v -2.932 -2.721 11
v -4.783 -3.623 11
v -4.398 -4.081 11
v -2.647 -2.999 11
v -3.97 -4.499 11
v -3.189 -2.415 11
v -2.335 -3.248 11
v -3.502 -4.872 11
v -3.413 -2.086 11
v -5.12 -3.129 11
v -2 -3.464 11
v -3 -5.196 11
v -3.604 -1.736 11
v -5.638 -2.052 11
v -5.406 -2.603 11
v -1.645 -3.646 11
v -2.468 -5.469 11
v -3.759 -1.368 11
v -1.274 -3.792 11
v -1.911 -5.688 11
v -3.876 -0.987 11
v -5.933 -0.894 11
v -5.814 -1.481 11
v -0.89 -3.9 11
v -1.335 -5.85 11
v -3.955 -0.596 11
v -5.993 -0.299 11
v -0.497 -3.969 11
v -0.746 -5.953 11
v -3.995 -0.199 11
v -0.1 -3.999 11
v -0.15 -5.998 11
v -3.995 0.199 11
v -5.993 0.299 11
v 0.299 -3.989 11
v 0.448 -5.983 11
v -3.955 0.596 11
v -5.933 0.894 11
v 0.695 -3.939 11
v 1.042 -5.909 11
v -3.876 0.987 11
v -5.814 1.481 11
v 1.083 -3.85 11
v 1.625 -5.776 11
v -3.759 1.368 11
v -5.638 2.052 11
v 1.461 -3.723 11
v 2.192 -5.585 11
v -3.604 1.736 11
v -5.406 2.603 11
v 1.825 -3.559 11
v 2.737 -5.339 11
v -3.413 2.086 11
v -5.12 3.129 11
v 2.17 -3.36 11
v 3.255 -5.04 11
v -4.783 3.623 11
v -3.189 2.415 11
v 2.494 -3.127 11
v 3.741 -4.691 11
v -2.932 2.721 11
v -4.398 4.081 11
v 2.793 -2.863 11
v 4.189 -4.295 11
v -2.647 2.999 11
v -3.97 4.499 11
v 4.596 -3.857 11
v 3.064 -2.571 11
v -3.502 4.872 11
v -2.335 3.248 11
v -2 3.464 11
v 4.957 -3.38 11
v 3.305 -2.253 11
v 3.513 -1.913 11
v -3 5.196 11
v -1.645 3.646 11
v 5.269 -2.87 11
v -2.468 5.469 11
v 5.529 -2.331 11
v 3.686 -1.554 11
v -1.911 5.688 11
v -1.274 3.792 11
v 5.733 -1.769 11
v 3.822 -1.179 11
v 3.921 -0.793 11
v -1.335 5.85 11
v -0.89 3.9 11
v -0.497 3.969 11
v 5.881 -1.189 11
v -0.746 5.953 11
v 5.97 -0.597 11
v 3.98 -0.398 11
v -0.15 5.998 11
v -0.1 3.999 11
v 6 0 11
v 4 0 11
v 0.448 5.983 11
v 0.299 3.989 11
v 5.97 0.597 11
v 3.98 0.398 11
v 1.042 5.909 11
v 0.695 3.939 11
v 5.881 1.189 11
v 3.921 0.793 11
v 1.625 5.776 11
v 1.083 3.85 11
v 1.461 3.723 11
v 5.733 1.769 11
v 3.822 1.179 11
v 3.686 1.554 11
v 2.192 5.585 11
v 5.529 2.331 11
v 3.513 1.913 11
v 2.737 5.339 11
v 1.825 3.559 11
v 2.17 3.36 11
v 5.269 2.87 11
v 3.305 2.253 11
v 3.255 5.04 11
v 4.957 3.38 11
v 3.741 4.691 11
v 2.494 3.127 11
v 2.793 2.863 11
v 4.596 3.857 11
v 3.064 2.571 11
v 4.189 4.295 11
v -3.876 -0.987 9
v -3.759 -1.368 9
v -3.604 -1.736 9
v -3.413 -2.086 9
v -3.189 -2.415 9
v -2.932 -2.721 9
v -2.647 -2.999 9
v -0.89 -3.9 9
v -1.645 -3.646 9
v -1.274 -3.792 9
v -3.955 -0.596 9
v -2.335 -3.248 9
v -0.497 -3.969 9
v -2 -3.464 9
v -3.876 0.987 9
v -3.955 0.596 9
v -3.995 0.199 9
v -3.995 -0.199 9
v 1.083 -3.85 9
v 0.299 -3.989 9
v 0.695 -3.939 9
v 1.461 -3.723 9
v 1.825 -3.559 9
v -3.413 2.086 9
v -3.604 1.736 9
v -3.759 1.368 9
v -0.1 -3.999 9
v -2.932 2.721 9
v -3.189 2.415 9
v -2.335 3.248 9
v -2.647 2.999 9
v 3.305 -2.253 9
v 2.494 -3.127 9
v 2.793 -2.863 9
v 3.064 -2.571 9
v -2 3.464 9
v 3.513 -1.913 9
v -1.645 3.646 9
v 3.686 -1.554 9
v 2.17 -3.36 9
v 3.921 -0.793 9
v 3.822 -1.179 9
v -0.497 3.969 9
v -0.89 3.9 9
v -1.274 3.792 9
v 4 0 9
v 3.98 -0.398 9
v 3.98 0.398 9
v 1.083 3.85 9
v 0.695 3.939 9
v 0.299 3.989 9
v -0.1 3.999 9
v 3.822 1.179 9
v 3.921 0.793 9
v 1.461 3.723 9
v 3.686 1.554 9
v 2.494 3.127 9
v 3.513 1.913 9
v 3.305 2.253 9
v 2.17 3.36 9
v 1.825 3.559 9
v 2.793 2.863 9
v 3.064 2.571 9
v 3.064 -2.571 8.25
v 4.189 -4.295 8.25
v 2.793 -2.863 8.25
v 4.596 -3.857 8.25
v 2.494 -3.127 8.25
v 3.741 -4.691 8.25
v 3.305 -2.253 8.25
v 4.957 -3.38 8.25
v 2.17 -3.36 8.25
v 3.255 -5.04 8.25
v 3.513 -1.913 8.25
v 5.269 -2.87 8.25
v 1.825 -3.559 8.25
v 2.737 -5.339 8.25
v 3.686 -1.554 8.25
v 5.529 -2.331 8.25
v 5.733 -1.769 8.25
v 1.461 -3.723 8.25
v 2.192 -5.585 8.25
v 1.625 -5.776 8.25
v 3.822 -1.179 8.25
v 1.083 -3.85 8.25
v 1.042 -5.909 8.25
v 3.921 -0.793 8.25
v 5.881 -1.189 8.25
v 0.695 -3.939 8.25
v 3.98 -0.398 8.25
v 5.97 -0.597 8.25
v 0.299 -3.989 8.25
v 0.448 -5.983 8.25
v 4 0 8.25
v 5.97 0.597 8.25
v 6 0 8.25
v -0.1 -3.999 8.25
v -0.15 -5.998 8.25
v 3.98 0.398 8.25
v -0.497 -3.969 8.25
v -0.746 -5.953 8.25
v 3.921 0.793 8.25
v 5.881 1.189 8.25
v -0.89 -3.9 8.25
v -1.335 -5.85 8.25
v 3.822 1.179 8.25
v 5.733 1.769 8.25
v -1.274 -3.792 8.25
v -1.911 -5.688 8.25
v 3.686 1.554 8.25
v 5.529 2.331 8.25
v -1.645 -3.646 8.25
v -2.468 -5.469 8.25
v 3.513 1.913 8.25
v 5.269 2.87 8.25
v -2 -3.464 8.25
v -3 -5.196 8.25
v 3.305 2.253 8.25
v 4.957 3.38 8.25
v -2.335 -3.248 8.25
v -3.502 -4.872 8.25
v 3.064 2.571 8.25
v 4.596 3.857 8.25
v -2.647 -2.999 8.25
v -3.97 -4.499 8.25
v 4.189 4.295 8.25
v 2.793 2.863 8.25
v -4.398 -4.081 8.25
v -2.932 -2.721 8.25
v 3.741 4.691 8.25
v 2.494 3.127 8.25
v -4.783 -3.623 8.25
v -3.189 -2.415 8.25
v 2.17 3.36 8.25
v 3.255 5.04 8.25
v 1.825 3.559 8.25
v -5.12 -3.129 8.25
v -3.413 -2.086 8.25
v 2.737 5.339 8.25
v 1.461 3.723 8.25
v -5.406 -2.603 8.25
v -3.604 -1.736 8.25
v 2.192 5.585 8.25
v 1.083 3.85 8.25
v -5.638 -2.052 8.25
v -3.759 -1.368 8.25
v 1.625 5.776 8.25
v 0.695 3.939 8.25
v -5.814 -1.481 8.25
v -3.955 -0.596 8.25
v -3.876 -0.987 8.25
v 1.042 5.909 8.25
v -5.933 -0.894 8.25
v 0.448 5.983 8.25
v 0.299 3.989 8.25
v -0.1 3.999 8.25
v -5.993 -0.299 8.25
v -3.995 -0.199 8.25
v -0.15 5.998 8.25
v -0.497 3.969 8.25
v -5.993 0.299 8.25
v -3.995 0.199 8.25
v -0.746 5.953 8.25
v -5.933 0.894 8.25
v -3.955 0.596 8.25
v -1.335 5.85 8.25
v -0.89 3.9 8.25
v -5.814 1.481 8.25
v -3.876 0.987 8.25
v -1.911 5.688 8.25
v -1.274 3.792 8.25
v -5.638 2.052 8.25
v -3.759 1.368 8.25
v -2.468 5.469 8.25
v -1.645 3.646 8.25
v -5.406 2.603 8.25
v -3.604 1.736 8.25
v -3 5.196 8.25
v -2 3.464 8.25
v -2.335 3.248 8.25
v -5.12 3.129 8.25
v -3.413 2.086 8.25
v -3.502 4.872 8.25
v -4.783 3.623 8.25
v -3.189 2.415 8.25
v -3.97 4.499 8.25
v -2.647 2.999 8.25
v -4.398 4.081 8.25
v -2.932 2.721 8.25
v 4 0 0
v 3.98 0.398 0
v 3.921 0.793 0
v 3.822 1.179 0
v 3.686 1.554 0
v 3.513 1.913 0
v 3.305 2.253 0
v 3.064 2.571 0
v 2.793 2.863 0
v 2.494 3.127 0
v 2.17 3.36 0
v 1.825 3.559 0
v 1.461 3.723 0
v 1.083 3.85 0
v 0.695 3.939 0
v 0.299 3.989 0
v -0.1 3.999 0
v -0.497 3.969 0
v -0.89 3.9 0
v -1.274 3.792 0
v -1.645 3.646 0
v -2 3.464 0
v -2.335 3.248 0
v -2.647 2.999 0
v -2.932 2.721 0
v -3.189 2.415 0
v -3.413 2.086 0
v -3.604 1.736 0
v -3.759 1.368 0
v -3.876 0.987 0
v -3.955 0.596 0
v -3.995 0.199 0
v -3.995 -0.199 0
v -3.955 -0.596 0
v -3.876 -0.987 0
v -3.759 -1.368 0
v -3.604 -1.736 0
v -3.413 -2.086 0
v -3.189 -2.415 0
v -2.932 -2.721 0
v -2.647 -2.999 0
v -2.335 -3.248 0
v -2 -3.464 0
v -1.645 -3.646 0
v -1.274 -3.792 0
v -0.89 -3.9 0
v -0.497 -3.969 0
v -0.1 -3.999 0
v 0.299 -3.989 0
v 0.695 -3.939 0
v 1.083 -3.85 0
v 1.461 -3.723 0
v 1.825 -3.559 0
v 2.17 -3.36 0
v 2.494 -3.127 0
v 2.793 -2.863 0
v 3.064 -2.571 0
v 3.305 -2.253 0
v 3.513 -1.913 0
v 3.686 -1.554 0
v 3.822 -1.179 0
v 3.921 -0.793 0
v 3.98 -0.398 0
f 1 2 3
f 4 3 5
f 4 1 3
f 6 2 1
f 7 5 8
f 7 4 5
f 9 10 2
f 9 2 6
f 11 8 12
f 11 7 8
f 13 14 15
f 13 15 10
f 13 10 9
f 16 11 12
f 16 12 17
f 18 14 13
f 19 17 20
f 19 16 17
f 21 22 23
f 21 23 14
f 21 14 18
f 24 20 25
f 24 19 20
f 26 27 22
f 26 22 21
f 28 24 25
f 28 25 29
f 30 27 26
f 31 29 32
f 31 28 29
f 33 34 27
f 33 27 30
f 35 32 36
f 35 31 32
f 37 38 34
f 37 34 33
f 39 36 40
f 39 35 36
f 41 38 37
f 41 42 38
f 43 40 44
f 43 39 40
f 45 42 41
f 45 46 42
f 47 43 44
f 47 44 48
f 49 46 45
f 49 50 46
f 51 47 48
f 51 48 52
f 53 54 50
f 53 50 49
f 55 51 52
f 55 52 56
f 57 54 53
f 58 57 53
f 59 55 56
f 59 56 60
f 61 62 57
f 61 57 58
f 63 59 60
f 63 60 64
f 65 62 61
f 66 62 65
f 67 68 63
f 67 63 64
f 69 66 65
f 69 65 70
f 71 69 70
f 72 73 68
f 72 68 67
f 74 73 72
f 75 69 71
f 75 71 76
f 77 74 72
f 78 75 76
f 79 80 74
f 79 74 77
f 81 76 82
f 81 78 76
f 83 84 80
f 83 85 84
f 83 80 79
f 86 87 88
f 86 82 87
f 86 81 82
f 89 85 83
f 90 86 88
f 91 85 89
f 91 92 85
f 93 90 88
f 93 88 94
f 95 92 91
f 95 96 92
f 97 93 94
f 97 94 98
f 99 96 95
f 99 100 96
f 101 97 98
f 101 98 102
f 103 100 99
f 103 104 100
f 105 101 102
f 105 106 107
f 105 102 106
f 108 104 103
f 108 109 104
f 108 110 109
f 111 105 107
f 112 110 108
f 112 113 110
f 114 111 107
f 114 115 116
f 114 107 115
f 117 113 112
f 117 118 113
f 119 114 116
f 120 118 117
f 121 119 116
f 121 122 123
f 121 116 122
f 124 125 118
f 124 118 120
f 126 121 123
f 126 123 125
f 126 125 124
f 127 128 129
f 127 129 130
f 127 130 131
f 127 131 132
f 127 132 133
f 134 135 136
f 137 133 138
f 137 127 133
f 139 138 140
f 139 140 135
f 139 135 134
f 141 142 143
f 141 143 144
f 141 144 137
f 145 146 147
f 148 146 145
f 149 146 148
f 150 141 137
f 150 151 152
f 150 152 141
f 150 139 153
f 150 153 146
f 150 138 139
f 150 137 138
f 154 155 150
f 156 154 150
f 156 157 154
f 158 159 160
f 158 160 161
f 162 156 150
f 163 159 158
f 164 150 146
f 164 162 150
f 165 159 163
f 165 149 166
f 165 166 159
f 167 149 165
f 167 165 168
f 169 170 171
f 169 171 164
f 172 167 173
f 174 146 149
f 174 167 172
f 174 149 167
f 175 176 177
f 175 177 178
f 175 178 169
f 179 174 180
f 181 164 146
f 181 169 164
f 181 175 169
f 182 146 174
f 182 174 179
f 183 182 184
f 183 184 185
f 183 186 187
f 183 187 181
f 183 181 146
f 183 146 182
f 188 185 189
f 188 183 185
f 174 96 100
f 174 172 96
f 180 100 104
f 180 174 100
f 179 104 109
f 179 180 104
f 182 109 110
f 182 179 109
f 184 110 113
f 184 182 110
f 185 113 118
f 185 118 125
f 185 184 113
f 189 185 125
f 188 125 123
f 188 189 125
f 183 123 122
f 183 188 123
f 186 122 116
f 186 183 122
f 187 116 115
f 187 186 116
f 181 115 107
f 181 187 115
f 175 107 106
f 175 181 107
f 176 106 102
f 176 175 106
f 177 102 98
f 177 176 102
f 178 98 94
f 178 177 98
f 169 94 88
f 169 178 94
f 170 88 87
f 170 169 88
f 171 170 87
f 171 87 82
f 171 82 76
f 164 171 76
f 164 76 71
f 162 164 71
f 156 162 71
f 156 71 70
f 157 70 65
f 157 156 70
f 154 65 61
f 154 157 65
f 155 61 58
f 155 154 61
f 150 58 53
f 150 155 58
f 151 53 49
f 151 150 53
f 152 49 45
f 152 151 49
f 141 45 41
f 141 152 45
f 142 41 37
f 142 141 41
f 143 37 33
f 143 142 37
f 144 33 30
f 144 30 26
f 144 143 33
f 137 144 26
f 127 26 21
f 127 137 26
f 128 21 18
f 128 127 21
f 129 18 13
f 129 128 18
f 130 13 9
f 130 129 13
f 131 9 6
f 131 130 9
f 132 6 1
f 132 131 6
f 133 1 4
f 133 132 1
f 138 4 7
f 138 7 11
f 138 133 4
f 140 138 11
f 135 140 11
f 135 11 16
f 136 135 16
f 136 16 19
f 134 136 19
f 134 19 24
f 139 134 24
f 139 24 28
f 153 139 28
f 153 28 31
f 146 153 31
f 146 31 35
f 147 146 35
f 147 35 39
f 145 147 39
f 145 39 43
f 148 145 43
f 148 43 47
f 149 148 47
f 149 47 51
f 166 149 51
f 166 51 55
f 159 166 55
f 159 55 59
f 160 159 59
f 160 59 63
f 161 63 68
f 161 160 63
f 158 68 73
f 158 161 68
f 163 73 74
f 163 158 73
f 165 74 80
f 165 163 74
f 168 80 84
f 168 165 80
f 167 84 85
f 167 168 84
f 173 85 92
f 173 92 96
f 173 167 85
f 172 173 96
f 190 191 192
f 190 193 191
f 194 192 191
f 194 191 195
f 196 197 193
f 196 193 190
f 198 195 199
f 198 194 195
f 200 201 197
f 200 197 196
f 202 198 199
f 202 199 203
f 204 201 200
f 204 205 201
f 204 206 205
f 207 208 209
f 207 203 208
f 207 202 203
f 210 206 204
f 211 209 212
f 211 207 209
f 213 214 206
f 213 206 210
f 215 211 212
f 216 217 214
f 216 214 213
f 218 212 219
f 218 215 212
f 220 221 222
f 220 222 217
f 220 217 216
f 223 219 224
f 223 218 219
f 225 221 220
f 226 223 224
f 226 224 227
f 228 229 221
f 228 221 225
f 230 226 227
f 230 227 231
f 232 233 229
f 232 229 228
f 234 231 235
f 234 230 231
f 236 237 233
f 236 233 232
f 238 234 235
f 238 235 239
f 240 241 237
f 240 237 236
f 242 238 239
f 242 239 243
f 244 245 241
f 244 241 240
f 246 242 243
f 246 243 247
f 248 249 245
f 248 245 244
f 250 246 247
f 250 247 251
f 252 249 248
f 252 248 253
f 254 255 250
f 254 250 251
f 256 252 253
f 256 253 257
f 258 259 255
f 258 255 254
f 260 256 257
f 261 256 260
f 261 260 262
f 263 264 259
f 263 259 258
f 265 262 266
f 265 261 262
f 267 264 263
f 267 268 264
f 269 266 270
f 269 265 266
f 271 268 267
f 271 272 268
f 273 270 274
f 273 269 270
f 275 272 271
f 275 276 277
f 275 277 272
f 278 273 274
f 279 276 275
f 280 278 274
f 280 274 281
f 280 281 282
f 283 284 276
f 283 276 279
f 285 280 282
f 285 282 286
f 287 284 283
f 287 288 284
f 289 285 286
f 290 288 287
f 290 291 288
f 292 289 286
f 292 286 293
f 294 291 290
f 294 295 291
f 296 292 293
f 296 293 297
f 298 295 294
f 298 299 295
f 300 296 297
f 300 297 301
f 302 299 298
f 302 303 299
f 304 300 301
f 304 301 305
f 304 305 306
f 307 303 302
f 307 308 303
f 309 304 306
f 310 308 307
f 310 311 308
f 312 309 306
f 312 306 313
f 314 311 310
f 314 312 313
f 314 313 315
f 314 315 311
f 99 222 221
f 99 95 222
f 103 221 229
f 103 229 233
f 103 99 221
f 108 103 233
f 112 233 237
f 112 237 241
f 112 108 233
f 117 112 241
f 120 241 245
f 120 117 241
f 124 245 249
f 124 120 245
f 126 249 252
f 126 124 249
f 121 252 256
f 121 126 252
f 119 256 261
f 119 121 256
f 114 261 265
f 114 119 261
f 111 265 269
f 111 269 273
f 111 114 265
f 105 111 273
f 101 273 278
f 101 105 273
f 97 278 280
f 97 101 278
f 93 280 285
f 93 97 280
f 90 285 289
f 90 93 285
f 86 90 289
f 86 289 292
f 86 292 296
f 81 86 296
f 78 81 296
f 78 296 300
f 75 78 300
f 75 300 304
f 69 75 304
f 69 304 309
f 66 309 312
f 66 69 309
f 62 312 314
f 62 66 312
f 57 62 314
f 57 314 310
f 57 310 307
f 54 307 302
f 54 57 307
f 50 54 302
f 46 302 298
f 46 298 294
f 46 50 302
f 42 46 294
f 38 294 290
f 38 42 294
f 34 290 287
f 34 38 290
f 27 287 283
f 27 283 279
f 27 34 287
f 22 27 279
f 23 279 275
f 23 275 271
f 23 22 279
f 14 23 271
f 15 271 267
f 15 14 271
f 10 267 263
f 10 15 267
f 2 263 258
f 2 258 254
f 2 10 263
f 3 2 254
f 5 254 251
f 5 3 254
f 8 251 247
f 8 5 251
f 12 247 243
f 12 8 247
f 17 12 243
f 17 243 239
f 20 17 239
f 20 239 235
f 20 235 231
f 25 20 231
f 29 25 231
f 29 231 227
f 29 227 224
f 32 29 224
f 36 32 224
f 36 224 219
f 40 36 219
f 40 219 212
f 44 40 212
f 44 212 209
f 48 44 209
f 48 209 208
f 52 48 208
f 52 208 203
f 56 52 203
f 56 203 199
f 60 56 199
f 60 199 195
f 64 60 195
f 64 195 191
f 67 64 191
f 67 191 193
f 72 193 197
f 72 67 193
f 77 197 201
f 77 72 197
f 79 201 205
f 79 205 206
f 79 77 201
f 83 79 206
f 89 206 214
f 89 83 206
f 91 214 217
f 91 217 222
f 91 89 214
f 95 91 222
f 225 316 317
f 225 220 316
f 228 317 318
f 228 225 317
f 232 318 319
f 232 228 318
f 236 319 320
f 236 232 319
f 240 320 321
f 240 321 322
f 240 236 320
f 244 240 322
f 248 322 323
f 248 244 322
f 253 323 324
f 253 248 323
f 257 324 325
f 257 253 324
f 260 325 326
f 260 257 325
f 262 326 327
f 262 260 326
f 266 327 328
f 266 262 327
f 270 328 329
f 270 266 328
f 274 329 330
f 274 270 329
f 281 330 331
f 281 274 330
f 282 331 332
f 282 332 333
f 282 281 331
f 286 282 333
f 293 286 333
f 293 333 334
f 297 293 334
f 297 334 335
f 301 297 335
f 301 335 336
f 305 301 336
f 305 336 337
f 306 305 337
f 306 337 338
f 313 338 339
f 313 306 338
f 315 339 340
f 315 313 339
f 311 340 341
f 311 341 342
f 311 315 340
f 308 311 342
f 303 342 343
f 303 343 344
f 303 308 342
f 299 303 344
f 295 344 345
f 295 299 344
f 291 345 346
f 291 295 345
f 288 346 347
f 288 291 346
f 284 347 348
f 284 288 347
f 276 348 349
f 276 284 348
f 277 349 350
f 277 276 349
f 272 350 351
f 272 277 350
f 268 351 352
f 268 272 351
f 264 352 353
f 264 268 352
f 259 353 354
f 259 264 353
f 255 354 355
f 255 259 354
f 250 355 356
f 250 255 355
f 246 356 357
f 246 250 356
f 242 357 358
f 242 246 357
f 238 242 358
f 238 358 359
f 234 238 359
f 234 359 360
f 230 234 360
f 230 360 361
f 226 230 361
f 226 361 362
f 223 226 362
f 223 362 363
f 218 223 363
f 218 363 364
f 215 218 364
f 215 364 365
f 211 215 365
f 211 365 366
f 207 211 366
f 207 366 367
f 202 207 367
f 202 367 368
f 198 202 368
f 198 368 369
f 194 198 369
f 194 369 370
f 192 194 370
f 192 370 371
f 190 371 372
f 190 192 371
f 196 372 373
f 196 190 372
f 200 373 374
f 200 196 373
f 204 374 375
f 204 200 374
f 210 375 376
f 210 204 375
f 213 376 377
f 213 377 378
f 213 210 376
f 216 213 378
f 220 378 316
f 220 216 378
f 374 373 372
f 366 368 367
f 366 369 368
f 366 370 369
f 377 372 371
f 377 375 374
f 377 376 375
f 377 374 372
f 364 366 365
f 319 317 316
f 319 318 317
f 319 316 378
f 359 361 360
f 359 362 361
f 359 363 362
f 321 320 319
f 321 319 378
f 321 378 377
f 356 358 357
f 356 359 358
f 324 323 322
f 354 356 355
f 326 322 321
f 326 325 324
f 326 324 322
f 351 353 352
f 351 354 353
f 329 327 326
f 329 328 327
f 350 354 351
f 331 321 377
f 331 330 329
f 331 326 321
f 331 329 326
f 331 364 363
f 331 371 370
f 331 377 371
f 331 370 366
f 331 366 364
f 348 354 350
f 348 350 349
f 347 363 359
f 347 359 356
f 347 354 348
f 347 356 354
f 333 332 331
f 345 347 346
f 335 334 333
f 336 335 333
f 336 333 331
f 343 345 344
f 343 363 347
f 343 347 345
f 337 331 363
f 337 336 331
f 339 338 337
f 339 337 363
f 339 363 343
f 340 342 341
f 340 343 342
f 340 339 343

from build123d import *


with BuildPart() as f1:
    # F0 (on Front) → F1 (revolve)
    with BuildSketch(Plane.XZ):
        Polygon((0, 8), (0, 0), (4, 0), (4, 8.25), (4, 9), (0, 9), align=None)
        Polygon((4, 9), (4, 8.25), (6, 8.25), (6, 11), (4, 11), align=None)
    revolve(axis=Axis((0, 0, 4), (0, 0, 1)))


solid = f1.part
